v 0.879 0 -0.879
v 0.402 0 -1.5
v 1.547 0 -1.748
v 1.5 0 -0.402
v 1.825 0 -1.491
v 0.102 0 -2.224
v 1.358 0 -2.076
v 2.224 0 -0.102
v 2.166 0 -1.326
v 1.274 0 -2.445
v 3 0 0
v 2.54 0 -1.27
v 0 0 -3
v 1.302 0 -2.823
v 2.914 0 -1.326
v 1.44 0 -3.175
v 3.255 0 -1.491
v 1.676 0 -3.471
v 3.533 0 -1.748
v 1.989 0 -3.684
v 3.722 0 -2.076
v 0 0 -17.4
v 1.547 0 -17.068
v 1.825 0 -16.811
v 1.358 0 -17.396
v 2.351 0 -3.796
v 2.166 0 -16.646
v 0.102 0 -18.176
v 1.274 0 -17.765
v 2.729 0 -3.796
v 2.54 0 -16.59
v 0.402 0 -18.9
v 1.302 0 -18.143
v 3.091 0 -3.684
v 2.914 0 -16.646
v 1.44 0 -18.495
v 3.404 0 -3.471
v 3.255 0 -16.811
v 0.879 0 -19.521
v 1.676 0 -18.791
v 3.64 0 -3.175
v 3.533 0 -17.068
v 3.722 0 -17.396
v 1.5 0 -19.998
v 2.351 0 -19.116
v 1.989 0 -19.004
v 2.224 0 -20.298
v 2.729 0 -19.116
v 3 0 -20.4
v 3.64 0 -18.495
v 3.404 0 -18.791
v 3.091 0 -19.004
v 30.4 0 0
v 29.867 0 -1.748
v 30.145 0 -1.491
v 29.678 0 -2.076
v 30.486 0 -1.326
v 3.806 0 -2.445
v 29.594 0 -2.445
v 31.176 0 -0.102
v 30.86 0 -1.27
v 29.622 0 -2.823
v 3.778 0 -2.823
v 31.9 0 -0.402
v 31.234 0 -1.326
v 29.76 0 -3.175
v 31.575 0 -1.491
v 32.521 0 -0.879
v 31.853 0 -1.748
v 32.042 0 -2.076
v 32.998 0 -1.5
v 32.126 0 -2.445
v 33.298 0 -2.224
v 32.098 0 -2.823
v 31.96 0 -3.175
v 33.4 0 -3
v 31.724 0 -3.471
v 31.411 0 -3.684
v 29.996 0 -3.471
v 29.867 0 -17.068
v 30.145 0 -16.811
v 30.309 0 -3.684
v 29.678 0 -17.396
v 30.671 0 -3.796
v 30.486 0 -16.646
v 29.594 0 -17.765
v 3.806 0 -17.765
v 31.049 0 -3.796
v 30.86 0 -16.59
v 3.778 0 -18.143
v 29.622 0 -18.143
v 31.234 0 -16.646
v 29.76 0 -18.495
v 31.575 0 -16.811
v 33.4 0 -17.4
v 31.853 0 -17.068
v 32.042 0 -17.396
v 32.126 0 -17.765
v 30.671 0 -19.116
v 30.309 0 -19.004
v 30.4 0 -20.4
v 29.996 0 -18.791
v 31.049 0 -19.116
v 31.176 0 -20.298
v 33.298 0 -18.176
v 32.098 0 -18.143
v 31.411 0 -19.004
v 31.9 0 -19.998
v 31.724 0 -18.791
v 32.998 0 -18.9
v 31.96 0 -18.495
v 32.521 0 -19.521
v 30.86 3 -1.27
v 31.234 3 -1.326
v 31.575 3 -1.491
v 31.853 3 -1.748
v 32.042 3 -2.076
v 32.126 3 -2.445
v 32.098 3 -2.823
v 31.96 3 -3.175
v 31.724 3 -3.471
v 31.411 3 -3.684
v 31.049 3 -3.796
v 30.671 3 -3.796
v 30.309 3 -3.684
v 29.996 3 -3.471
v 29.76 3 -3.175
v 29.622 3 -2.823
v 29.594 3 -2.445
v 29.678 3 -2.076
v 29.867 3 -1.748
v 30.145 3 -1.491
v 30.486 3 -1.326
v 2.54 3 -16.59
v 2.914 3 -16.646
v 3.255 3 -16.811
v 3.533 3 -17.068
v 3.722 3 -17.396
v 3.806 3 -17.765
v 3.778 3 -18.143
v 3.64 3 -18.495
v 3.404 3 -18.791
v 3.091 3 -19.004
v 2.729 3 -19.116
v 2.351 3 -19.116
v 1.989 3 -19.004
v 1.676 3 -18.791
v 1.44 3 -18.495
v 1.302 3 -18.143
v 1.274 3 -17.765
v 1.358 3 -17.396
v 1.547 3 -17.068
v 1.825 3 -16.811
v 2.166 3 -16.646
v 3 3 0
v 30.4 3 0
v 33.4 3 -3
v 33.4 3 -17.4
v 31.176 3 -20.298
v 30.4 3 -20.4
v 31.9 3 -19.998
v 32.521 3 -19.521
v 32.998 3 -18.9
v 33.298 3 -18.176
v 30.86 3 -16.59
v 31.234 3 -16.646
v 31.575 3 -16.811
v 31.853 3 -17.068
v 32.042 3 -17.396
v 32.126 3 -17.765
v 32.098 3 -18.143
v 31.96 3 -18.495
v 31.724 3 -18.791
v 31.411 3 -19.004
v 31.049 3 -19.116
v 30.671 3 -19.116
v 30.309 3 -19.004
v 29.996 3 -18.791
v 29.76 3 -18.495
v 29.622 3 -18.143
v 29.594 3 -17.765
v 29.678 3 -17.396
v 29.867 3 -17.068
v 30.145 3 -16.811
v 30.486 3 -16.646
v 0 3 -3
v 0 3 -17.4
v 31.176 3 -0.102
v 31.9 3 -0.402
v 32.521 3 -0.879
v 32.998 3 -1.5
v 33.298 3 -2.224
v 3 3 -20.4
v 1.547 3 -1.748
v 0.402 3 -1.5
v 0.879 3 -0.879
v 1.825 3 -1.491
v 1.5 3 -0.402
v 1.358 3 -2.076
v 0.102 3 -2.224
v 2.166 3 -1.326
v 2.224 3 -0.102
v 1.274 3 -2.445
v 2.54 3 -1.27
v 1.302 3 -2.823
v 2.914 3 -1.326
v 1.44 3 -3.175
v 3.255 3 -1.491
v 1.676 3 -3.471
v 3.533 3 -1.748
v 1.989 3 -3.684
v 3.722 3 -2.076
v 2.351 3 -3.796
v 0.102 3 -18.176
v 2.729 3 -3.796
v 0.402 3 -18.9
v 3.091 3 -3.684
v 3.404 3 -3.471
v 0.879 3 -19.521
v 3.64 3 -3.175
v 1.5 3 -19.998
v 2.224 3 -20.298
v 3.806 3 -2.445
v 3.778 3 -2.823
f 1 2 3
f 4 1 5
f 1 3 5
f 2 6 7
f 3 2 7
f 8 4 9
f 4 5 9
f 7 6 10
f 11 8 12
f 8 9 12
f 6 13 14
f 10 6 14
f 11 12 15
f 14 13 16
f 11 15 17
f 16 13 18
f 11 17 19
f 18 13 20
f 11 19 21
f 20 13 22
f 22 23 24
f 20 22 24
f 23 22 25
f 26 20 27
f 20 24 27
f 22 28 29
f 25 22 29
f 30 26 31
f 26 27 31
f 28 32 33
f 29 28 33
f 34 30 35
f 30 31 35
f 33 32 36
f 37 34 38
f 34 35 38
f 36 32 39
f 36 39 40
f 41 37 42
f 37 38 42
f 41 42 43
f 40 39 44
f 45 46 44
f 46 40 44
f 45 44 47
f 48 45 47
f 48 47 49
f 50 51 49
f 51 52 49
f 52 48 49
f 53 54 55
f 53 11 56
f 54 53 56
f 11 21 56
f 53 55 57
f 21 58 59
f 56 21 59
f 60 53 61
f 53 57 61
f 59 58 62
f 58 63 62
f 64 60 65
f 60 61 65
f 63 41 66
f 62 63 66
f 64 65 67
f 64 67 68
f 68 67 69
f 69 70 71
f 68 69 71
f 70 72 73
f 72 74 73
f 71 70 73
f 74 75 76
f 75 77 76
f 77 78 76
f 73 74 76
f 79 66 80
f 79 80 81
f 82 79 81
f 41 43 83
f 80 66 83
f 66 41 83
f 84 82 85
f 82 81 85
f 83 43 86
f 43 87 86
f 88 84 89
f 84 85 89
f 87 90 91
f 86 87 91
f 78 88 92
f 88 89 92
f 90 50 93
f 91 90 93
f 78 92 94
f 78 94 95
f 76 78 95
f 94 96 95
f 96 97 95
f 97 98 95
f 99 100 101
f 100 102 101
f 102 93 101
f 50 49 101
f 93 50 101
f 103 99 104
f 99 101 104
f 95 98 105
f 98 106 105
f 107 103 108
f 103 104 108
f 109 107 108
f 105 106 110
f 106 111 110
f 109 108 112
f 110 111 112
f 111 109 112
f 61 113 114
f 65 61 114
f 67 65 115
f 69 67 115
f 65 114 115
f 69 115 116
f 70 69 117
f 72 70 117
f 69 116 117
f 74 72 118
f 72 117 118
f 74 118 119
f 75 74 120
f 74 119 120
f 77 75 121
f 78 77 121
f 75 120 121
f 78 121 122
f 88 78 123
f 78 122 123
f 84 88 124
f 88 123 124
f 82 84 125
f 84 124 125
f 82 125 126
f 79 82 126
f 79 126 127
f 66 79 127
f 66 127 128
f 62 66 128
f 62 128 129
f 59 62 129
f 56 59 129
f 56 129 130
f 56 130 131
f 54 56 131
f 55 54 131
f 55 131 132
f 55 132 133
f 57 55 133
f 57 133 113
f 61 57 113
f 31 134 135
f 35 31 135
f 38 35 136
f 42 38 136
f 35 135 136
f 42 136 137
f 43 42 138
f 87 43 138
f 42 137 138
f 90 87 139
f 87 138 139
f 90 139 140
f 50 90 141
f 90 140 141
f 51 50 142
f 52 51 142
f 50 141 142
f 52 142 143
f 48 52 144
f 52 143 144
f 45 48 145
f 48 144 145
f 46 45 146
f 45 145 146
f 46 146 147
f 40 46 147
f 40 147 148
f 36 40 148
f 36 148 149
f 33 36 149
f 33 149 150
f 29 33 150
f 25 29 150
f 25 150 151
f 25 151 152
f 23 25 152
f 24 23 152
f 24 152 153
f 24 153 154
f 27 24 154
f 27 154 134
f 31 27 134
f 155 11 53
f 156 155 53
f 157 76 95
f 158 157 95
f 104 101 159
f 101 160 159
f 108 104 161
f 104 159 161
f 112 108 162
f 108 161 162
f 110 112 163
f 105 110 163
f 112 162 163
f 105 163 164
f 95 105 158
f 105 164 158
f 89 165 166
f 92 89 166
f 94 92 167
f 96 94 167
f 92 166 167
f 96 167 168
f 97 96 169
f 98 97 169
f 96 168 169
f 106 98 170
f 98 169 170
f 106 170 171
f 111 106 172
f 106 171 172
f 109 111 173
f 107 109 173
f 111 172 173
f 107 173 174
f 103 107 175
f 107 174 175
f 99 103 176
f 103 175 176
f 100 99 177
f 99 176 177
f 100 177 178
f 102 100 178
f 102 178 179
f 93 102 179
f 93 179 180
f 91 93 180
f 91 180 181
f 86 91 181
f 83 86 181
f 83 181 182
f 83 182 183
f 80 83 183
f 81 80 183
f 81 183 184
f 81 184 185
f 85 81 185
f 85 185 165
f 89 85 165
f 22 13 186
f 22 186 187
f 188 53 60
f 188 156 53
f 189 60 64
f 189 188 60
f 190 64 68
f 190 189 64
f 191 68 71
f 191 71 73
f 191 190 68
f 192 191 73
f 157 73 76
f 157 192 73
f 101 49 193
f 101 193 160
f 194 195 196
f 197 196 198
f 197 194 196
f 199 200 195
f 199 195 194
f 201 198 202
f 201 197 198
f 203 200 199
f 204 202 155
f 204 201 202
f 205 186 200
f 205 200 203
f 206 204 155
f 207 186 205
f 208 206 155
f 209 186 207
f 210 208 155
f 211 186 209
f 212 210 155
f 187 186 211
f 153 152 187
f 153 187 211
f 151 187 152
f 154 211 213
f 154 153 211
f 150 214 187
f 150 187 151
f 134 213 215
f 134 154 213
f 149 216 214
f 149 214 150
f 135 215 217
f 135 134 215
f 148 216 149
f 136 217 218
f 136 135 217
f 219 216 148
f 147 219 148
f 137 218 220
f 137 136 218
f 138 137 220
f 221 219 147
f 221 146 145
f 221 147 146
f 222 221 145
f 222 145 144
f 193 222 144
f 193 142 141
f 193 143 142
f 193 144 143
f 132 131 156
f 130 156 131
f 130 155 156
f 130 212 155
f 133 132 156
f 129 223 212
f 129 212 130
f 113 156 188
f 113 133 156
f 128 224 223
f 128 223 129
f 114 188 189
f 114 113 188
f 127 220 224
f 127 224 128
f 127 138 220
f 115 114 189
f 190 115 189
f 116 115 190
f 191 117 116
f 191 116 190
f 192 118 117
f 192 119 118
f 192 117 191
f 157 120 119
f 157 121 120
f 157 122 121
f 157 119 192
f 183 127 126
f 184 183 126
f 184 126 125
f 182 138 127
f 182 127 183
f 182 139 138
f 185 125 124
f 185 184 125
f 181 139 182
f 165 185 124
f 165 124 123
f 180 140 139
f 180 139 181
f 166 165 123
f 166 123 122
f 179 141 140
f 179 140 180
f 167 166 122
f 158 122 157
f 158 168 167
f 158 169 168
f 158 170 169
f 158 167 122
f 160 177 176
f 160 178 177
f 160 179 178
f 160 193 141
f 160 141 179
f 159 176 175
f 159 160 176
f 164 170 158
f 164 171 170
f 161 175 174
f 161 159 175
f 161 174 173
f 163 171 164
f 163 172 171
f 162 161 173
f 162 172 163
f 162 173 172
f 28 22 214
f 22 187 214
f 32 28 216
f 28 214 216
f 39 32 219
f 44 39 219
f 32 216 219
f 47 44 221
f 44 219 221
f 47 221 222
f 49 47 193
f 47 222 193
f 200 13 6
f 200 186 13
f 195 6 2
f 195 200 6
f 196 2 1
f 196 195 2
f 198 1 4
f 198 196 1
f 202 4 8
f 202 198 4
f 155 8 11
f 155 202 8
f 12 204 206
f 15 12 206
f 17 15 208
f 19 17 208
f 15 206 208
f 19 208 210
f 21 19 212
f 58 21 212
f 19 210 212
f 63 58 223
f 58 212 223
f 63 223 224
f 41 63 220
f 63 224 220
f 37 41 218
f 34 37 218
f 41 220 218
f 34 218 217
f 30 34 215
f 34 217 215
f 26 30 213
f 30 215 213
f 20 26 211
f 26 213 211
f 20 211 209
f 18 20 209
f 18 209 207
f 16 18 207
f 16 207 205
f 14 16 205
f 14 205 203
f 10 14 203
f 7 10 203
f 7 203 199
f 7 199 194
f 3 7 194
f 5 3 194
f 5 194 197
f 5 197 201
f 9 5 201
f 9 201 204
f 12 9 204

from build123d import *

# Parameters (mm, degrees)
SKETCH1_W           = 33.4
SKETCH1_H           = 20.4
BOSS_EXTRUDE1_DEPTH = 3
SKETCH4_R           = 1.27
CUT_EXTRUDE1_DEPTH  = 40.252006318
FILLET5_R           = 3


with BuildPart() as part:
    # Sketch1 → Boss-Extrude1 (new body)
    with BuildSketch(Plane(origin=(0, 0, 0), x_dir=(1, 0, 0), z_dir=(0, 1, 0))):
        with Locations((16.7, 10.2)):
            Rectangle(SKETCH1_W, SKETCH1_H)
    extrude(amount=BOSS_EXTRUDE1_DEPTH)

    # Sketch4 → Cut-Extrude1 (cut, through all)
    with BuildSketch(Plane(origin=(0, 3, 0), x_dir=(1, 0, 0), z_dir=(0, 1, 0))):
        with Locations(Location((2.54, 17.86, 0), (0, 0, 270))):
            Circle(SKETCH4_R)
        with Locations(Location((2.54, 2.54, 0), (0, 0, 270))):
            Circle(SKETCH4_R)
        with Locations(Location((30.86, 17.86, 0), (0, 0, 270))):
            Circle(SKETCH4_R)
        with Locations(Location((30.86, 2.54, 0), (0, 0, 270))):
            Circle(SKETCH4_R)
    extrude(amount=-CUT_EXTRUDE1_DEPTH, mode=Mode.SUBTRACT)

    # Fillet5
    fillet5_edges = [part.edges().sort_by_distance(p)[0] for p in [
        (0, 1.5, 0),
        (0, 1.5, -20.4),
        (33.4, 1.5, -20.4),
        (33.4, 1.5, 0),
    ]]
    fillet(fillet5_edges, radius=FILLET5_R)


solid = part.part
